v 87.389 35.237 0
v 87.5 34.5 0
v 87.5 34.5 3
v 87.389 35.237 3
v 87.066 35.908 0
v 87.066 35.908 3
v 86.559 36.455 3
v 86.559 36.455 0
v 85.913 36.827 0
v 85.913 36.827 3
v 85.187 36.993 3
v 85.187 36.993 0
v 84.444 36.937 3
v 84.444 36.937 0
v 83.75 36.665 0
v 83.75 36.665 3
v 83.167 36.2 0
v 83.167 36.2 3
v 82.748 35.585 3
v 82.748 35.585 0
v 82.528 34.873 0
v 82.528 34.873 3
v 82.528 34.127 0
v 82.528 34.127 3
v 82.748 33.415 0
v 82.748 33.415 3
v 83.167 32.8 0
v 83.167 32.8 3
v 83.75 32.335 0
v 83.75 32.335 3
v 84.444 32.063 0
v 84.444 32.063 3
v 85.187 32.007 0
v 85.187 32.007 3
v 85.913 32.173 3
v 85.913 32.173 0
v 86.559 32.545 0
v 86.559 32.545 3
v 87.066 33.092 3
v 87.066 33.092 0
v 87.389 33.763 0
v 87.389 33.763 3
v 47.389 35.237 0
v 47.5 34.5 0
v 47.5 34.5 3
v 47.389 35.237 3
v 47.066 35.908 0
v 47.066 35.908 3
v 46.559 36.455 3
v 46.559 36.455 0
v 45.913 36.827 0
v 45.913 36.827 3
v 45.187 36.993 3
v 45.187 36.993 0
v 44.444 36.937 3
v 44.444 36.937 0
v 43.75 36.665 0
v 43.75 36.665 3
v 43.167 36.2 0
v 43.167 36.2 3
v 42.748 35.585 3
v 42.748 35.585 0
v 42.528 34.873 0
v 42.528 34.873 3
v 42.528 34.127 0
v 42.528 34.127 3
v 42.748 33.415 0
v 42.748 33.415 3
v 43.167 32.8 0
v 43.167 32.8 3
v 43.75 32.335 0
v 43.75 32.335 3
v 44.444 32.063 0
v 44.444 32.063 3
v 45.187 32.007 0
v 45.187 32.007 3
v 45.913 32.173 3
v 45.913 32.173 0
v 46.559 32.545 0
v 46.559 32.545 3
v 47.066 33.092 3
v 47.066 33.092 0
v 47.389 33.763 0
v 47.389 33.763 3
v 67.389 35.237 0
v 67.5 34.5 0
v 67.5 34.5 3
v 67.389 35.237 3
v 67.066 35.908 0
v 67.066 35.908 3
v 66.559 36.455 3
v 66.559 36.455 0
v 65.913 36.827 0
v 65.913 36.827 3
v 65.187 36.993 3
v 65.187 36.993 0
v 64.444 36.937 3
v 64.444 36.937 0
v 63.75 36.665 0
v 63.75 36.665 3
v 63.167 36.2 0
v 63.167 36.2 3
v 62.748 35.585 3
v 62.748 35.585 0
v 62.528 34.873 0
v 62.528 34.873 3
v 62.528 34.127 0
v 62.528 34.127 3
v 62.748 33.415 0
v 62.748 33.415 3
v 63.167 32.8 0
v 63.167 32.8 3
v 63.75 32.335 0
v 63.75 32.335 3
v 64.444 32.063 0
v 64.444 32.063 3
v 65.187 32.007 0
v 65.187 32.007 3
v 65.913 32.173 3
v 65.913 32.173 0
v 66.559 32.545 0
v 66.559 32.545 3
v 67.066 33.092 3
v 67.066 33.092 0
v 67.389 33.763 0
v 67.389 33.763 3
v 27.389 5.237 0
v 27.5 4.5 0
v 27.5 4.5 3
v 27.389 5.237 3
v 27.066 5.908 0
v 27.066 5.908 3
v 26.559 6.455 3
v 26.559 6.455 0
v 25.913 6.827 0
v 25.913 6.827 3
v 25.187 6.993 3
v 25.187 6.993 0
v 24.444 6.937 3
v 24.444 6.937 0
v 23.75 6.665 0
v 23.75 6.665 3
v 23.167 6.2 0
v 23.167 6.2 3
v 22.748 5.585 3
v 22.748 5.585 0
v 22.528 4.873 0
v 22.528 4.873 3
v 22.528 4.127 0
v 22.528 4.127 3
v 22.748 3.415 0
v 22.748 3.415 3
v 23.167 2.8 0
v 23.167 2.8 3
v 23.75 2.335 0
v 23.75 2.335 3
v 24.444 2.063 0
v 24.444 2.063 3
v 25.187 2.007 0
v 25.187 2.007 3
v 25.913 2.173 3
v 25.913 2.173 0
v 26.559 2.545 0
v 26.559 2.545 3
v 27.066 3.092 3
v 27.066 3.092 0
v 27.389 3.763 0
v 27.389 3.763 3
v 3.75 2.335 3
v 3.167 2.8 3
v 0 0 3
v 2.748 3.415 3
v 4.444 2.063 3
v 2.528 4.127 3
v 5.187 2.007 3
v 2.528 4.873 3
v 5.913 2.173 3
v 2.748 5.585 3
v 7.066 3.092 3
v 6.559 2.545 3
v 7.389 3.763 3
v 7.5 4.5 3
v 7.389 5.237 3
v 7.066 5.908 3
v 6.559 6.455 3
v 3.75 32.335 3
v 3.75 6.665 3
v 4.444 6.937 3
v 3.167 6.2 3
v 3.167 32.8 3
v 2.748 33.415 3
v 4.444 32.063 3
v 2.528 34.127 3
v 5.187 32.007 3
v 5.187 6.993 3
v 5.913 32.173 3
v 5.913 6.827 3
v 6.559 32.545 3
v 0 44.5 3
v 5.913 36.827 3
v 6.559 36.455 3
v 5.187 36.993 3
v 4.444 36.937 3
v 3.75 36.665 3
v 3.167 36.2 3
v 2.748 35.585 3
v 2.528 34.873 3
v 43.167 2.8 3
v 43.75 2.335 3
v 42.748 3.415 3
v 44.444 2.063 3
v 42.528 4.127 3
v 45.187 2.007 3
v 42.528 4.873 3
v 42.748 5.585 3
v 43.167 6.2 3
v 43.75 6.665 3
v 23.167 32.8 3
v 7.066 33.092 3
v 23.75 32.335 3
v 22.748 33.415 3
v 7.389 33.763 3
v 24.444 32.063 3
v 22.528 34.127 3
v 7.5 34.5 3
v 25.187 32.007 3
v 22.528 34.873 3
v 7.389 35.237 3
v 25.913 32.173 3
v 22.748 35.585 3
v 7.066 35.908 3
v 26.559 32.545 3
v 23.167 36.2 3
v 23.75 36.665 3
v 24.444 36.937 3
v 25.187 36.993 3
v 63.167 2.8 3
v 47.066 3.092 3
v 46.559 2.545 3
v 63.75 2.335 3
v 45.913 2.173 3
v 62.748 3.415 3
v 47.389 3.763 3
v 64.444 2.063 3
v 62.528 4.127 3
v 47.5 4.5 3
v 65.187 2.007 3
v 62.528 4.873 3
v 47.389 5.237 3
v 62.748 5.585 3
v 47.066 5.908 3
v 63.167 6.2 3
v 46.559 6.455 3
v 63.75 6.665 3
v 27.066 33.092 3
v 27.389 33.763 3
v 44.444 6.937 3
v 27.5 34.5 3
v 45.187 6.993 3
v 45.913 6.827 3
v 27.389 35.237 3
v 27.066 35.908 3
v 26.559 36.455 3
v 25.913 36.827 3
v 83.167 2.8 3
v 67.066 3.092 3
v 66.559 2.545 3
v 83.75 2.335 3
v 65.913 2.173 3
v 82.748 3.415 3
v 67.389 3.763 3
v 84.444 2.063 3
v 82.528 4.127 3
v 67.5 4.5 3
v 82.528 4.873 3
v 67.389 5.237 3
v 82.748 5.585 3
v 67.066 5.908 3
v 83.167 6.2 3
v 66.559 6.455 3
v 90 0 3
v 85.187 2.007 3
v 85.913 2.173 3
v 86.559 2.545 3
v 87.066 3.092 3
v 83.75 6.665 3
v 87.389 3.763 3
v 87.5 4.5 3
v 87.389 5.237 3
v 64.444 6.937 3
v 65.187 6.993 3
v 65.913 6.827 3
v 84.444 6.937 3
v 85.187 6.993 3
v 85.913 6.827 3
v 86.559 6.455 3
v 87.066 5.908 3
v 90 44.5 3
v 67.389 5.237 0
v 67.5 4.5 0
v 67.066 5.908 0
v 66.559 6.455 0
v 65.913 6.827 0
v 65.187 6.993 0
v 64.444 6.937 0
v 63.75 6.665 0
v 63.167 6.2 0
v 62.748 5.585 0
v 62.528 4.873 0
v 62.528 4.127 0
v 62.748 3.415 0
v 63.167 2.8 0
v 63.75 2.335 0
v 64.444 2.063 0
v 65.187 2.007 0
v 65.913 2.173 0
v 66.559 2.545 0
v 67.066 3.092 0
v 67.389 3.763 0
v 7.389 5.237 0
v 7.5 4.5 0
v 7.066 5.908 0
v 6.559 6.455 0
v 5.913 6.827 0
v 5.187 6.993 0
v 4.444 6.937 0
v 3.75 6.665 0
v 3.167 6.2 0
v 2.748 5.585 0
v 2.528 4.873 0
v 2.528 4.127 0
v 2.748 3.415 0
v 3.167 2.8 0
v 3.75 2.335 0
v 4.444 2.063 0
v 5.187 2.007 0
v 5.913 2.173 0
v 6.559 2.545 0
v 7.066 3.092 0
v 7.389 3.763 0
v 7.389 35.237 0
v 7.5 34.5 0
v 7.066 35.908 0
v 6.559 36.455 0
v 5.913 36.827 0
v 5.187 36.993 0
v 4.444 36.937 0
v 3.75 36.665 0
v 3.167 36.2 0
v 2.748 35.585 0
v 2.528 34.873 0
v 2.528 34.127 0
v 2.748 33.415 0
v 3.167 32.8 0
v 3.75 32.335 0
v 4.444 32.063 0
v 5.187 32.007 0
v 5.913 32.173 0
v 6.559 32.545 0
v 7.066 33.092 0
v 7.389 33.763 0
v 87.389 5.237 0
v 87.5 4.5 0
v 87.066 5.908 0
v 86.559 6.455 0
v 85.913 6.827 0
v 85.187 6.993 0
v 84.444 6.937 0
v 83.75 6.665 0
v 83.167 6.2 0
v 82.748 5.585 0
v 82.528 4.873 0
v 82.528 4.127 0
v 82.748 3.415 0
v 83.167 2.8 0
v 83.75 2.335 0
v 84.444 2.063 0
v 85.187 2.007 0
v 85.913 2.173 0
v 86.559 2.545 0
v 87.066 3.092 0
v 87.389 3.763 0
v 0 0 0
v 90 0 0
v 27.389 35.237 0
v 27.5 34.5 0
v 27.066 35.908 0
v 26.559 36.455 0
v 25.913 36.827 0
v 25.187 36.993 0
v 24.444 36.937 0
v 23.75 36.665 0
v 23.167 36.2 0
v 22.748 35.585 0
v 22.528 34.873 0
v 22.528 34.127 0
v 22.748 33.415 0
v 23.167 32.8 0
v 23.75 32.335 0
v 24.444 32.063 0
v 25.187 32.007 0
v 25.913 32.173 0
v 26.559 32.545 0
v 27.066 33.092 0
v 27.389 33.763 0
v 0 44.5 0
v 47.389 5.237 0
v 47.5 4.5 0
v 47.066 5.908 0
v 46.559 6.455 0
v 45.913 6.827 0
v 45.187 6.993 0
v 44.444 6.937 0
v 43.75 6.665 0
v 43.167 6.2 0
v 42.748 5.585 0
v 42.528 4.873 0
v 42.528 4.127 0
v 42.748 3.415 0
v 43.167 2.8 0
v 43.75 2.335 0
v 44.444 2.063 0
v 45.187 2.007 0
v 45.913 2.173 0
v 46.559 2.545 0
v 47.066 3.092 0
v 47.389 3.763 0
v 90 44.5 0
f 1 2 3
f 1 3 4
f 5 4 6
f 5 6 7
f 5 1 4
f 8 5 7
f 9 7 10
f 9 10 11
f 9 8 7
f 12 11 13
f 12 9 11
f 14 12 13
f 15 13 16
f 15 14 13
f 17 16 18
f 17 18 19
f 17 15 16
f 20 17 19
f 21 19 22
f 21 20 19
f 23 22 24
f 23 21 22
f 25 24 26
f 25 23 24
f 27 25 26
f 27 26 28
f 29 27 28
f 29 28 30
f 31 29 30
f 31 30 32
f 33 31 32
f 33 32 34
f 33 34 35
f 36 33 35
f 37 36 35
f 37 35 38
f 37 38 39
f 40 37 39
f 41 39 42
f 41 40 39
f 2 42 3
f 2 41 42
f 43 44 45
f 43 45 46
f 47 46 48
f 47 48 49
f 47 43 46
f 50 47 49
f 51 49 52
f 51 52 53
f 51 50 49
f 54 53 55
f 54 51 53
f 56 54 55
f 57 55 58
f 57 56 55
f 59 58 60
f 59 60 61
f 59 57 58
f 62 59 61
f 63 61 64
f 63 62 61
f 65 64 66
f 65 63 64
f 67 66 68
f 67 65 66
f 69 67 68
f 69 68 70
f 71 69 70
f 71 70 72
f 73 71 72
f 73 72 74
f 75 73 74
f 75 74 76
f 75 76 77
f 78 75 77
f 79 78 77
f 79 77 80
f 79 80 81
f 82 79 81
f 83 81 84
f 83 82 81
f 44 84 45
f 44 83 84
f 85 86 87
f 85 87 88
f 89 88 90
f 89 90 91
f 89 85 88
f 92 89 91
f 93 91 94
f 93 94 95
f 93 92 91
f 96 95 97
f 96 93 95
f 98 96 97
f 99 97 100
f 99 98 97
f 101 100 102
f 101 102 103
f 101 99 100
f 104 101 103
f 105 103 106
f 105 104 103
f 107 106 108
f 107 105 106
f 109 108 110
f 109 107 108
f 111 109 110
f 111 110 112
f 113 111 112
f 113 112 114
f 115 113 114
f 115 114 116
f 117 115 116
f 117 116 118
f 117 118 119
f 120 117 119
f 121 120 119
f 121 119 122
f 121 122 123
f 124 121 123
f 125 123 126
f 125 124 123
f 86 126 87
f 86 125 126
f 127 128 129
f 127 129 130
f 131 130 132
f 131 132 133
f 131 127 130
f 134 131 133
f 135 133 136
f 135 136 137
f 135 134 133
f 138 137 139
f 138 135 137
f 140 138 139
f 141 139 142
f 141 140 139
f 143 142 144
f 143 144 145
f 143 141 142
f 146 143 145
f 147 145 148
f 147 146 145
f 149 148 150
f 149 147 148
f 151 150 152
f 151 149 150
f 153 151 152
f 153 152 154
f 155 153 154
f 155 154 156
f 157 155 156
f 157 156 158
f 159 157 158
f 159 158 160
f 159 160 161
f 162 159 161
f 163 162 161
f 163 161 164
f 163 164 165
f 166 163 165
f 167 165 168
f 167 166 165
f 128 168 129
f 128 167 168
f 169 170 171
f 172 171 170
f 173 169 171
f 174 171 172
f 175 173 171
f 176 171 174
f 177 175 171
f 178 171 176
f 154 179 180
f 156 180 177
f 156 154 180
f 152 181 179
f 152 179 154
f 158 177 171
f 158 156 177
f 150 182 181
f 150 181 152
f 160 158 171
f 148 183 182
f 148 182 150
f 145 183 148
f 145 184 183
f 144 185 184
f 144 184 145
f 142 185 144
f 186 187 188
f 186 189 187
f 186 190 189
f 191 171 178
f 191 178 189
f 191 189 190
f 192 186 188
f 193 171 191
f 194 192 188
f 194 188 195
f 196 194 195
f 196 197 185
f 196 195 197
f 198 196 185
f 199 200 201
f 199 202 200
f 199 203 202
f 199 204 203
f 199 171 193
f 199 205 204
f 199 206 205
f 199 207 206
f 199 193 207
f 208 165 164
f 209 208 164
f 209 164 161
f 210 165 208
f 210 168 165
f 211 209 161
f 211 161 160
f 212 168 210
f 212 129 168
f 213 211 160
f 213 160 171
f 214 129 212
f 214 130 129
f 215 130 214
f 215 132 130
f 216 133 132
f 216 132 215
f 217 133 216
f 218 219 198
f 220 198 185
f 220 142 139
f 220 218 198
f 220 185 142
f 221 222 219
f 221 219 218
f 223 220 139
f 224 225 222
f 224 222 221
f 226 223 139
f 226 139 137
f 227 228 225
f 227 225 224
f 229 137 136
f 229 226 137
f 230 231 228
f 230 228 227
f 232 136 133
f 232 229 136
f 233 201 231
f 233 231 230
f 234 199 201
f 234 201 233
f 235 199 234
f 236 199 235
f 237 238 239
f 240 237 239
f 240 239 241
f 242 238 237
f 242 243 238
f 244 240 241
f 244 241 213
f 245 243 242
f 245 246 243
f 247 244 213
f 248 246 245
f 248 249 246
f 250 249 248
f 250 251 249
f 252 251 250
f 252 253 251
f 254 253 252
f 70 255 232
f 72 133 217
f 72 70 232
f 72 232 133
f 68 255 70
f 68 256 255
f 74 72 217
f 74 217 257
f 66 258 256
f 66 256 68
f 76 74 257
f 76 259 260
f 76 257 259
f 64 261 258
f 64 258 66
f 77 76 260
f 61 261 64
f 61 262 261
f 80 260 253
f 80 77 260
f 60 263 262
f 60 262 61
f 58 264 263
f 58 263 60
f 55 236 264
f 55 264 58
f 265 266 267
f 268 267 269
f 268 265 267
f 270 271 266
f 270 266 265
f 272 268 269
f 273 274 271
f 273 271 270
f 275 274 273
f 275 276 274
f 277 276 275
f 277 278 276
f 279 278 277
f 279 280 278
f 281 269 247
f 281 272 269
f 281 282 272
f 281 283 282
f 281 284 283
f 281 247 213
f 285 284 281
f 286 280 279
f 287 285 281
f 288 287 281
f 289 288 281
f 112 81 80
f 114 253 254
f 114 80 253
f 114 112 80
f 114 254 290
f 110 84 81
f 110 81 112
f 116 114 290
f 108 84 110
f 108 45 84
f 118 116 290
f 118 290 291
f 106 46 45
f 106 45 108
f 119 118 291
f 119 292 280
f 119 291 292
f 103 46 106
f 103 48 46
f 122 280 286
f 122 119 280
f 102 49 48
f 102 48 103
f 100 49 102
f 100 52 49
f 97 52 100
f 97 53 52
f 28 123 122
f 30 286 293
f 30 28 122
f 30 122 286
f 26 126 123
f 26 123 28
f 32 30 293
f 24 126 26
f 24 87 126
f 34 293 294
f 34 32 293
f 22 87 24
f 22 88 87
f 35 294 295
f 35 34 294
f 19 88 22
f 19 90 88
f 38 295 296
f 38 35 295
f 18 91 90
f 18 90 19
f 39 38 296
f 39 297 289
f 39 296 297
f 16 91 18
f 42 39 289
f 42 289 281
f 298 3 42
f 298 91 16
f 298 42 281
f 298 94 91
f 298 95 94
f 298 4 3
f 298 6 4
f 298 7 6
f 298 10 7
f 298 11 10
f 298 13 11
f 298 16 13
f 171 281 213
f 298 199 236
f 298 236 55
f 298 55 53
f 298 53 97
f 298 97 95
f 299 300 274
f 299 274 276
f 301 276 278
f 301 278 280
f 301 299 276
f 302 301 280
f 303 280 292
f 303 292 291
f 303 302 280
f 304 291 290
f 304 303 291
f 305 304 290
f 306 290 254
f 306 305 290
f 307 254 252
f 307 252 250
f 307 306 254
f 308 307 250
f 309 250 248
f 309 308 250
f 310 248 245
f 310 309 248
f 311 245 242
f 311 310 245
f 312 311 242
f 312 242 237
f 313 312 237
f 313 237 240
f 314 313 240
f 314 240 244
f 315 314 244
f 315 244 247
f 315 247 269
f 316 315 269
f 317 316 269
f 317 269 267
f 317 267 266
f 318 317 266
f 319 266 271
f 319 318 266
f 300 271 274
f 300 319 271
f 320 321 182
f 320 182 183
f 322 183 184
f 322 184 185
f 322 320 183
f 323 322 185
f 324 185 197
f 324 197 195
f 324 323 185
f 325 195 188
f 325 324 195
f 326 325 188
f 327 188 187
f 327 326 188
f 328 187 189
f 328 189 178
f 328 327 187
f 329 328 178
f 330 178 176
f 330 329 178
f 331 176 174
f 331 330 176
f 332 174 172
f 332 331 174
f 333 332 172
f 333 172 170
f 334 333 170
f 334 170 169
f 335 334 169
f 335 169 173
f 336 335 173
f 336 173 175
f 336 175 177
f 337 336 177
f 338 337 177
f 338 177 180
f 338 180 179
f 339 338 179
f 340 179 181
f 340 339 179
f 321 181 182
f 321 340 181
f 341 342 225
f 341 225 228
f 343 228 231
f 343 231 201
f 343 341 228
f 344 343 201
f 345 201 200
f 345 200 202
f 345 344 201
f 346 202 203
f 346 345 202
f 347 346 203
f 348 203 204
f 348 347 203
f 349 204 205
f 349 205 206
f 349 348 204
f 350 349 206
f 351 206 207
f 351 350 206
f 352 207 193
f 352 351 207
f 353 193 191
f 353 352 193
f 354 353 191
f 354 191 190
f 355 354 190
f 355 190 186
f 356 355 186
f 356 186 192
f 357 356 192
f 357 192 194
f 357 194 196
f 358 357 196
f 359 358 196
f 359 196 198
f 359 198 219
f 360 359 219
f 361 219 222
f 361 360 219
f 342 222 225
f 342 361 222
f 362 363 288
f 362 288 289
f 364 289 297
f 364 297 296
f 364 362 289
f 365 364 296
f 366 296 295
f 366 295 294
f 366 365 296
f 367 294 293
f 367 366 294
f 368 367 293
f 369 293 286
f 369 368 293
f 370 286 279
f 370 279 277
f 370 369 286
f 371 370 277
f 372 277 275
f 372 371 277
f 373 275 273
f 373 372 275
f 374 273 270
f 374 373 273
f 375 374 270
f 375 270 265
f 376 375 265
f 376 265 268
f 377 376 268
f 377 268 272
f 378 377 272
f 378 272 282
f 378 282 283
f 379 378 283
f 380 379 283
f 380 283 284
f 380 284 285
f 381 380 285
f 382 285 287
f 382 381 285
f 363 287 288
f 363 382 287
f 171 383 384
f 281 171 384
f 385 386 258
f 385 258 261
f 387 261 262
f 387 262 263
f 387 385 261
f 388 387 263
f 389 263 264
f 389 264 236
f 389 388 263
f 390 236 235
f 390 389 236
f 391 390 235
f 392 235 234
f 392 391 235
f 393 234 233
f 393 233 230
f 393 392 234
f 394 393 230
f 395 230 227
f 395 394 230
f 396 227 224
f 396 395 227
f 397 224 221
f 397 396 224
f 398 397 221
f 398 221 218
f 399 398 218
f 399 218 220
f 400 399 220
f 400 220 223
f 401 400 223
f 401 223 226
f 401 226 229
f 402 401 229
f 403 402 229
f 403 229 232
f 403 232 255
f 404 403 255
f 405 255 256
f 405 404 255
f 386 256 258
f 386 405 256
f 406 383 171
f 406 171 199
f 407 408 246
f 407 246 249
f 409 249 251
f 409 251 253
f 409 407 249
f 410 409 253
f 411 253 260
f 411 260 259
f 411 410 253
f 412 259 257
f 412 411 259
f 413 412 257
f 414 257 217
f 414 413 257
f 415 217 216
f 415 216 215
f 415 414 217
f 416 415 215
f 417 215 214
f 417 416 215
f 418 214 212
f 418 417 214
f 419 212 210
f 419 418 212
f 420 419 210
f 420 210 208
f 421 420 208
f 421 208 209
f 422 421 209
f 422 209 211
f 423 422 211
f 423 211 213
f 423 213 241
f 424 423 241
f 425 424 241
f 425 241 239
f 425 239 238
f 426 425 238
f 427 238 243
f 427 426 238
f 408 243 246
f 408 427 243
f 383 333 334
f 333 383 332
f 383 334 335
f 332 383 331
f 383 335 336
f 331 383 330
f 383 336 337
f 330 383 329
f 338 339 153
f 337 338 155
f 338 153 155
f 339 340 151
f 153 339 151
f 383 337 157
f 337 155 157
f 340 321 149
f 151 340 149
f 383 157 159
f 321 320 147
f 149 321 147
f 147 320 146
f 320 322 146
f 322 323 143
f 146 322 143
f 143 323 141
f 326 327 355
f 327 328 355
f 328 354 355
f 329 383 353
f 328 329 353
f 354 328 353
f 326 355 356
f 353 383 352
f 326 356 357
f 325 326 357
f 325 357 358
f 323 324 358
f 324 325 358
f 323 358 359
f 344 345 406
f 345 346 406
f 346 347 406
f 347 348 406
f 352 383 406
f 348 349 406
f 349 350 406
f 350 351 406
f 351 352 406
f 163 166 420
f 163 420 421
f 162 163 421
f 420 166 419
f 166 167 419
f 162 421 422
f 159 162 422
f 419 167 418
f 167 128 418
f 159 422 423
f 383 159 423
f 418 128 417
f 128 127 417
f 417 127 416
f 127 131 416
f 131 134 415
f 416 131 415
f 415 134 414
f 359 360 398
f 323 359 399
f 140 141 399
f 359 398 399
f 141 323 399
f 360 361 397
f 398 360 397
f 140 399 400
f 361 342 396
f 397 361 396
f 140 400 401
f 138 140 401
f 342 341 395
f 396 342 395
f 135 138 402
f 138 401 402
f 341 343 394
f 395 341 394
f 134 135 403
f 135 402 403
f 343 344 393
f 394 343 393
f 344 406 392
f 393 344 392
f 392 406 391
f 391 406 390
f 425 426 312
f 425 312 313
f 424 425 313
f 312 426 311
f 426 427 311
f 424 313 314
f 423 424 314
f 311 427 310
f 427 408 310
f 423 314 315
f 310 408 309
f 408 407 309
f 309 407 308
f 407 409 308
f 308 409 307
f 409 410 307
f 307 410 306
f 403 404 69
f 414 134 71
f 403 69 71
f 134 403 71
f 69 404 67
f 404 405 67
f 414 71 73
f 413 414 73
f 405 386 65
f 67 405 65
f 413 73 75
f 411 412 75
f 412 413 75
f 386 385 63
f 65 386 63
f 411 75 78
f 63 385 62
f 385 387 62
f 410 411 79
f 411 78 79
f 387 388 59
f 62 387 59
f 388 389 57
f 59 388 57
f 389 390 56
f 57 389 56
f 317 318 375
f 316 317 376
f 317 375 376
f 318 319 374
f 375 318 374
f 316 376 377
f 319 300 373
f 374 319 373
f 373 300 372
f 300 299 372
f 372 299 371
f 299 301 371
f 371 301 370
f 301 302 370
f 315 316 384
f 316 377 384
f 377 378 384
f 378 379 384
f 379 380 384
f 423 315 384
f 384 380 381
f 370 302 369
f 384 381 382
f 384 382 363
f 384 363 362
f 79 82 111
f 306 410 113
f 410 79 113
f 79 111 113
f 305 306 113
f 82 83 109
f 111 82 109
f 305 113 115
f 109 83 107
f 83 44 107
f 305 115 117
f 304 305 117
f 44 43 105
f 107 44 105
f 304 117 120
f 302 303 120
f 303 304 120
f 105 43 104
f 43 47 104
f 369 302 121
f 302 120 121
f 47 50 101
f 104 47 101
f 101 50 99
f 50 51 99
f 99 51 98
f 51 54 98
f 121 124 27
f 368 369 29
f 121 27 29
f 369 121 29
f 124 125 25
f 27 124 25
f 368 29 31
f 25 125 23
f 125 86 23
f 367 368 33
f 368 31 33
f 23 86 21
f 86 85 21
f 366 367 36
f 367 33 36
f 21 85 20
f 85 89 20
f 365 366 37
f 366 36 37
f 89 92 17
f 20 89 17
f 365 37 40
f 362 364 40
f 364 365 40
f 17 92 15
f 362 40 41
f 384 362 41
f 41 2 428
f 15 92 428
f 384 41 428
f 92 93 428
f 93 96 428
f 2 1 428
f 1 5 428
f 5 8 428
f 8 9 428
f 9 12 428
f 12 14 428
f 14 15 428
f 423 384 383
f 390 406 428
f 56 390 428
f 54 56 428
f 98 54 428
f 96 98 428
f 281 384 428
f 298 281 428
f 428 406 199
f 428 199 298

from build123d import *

# Parameters (mm, degrees)
SKETCH1_W           = 90
SKETCH1_H           = 14.5
SKETCH1_R           = 2.5
SKETCH1_H_2         = 30
BOSS_EXTRUDE1_DEPTH = 3


with BuildPart() as part:
    # Sketch1 → Boss-Extrude1 (new body)
    # profile 1 of 2: a face of its own
    with BuildSketch(Plane.XY):
        with Locations((45, 7.25)):
            Rectangle(SKETCH1_W, SKETCH1_H)
        with Locations((5, 4.5)):
            Circle(SKETCH1_R, mode=Mode.SUBTRACT)
        with Locations((25, 4.5)):
            Circle(SKETCH1_R, mode=Mode.SUBTRACT)
        with Locations((45, 4.5)):
            Circle(SKETCH1_R, mode=Mode.SUBTRACT)
        with Locations((65, 4.5)):
            Circle(SKETCH1_R, mode=Mode.SUBTRACT)
        with Locations((85, 4.5)):
            Circle(SKETCH1_R, mode=Mode.SUBTRACT)
    # profile 2 of 2: a face of its own
    with BuildSketch(Plane.XY):
        with Locations((45, 29.5)):
            Rectangle(SKETCH1_W, SKETCH1_H_2)
        with Locations((5, 34.5)):
            Circle(SKETCH1_R, mode=Mode.SUBTRACT)
        with Locations((25, 34.5)):
            Circle(SKETCH1_R, mode=Mode.SUBTRACT)
        with Locations((45, 34.5)):
            Circle(SKETCH1_R, mode=Mode.SUBTRACT)
        with Locations((65, 34.5)):
            Circle(SKETCH1_R, mode=Mode.SUBTRACT)
        with Locations((85, 34.5)):
            Circle(SKETCH1_R, mode=Mode.SUBTRACT)
    extrude(amount=BOSS_EXTRUDE1_DEPTH)


solid = part.part
